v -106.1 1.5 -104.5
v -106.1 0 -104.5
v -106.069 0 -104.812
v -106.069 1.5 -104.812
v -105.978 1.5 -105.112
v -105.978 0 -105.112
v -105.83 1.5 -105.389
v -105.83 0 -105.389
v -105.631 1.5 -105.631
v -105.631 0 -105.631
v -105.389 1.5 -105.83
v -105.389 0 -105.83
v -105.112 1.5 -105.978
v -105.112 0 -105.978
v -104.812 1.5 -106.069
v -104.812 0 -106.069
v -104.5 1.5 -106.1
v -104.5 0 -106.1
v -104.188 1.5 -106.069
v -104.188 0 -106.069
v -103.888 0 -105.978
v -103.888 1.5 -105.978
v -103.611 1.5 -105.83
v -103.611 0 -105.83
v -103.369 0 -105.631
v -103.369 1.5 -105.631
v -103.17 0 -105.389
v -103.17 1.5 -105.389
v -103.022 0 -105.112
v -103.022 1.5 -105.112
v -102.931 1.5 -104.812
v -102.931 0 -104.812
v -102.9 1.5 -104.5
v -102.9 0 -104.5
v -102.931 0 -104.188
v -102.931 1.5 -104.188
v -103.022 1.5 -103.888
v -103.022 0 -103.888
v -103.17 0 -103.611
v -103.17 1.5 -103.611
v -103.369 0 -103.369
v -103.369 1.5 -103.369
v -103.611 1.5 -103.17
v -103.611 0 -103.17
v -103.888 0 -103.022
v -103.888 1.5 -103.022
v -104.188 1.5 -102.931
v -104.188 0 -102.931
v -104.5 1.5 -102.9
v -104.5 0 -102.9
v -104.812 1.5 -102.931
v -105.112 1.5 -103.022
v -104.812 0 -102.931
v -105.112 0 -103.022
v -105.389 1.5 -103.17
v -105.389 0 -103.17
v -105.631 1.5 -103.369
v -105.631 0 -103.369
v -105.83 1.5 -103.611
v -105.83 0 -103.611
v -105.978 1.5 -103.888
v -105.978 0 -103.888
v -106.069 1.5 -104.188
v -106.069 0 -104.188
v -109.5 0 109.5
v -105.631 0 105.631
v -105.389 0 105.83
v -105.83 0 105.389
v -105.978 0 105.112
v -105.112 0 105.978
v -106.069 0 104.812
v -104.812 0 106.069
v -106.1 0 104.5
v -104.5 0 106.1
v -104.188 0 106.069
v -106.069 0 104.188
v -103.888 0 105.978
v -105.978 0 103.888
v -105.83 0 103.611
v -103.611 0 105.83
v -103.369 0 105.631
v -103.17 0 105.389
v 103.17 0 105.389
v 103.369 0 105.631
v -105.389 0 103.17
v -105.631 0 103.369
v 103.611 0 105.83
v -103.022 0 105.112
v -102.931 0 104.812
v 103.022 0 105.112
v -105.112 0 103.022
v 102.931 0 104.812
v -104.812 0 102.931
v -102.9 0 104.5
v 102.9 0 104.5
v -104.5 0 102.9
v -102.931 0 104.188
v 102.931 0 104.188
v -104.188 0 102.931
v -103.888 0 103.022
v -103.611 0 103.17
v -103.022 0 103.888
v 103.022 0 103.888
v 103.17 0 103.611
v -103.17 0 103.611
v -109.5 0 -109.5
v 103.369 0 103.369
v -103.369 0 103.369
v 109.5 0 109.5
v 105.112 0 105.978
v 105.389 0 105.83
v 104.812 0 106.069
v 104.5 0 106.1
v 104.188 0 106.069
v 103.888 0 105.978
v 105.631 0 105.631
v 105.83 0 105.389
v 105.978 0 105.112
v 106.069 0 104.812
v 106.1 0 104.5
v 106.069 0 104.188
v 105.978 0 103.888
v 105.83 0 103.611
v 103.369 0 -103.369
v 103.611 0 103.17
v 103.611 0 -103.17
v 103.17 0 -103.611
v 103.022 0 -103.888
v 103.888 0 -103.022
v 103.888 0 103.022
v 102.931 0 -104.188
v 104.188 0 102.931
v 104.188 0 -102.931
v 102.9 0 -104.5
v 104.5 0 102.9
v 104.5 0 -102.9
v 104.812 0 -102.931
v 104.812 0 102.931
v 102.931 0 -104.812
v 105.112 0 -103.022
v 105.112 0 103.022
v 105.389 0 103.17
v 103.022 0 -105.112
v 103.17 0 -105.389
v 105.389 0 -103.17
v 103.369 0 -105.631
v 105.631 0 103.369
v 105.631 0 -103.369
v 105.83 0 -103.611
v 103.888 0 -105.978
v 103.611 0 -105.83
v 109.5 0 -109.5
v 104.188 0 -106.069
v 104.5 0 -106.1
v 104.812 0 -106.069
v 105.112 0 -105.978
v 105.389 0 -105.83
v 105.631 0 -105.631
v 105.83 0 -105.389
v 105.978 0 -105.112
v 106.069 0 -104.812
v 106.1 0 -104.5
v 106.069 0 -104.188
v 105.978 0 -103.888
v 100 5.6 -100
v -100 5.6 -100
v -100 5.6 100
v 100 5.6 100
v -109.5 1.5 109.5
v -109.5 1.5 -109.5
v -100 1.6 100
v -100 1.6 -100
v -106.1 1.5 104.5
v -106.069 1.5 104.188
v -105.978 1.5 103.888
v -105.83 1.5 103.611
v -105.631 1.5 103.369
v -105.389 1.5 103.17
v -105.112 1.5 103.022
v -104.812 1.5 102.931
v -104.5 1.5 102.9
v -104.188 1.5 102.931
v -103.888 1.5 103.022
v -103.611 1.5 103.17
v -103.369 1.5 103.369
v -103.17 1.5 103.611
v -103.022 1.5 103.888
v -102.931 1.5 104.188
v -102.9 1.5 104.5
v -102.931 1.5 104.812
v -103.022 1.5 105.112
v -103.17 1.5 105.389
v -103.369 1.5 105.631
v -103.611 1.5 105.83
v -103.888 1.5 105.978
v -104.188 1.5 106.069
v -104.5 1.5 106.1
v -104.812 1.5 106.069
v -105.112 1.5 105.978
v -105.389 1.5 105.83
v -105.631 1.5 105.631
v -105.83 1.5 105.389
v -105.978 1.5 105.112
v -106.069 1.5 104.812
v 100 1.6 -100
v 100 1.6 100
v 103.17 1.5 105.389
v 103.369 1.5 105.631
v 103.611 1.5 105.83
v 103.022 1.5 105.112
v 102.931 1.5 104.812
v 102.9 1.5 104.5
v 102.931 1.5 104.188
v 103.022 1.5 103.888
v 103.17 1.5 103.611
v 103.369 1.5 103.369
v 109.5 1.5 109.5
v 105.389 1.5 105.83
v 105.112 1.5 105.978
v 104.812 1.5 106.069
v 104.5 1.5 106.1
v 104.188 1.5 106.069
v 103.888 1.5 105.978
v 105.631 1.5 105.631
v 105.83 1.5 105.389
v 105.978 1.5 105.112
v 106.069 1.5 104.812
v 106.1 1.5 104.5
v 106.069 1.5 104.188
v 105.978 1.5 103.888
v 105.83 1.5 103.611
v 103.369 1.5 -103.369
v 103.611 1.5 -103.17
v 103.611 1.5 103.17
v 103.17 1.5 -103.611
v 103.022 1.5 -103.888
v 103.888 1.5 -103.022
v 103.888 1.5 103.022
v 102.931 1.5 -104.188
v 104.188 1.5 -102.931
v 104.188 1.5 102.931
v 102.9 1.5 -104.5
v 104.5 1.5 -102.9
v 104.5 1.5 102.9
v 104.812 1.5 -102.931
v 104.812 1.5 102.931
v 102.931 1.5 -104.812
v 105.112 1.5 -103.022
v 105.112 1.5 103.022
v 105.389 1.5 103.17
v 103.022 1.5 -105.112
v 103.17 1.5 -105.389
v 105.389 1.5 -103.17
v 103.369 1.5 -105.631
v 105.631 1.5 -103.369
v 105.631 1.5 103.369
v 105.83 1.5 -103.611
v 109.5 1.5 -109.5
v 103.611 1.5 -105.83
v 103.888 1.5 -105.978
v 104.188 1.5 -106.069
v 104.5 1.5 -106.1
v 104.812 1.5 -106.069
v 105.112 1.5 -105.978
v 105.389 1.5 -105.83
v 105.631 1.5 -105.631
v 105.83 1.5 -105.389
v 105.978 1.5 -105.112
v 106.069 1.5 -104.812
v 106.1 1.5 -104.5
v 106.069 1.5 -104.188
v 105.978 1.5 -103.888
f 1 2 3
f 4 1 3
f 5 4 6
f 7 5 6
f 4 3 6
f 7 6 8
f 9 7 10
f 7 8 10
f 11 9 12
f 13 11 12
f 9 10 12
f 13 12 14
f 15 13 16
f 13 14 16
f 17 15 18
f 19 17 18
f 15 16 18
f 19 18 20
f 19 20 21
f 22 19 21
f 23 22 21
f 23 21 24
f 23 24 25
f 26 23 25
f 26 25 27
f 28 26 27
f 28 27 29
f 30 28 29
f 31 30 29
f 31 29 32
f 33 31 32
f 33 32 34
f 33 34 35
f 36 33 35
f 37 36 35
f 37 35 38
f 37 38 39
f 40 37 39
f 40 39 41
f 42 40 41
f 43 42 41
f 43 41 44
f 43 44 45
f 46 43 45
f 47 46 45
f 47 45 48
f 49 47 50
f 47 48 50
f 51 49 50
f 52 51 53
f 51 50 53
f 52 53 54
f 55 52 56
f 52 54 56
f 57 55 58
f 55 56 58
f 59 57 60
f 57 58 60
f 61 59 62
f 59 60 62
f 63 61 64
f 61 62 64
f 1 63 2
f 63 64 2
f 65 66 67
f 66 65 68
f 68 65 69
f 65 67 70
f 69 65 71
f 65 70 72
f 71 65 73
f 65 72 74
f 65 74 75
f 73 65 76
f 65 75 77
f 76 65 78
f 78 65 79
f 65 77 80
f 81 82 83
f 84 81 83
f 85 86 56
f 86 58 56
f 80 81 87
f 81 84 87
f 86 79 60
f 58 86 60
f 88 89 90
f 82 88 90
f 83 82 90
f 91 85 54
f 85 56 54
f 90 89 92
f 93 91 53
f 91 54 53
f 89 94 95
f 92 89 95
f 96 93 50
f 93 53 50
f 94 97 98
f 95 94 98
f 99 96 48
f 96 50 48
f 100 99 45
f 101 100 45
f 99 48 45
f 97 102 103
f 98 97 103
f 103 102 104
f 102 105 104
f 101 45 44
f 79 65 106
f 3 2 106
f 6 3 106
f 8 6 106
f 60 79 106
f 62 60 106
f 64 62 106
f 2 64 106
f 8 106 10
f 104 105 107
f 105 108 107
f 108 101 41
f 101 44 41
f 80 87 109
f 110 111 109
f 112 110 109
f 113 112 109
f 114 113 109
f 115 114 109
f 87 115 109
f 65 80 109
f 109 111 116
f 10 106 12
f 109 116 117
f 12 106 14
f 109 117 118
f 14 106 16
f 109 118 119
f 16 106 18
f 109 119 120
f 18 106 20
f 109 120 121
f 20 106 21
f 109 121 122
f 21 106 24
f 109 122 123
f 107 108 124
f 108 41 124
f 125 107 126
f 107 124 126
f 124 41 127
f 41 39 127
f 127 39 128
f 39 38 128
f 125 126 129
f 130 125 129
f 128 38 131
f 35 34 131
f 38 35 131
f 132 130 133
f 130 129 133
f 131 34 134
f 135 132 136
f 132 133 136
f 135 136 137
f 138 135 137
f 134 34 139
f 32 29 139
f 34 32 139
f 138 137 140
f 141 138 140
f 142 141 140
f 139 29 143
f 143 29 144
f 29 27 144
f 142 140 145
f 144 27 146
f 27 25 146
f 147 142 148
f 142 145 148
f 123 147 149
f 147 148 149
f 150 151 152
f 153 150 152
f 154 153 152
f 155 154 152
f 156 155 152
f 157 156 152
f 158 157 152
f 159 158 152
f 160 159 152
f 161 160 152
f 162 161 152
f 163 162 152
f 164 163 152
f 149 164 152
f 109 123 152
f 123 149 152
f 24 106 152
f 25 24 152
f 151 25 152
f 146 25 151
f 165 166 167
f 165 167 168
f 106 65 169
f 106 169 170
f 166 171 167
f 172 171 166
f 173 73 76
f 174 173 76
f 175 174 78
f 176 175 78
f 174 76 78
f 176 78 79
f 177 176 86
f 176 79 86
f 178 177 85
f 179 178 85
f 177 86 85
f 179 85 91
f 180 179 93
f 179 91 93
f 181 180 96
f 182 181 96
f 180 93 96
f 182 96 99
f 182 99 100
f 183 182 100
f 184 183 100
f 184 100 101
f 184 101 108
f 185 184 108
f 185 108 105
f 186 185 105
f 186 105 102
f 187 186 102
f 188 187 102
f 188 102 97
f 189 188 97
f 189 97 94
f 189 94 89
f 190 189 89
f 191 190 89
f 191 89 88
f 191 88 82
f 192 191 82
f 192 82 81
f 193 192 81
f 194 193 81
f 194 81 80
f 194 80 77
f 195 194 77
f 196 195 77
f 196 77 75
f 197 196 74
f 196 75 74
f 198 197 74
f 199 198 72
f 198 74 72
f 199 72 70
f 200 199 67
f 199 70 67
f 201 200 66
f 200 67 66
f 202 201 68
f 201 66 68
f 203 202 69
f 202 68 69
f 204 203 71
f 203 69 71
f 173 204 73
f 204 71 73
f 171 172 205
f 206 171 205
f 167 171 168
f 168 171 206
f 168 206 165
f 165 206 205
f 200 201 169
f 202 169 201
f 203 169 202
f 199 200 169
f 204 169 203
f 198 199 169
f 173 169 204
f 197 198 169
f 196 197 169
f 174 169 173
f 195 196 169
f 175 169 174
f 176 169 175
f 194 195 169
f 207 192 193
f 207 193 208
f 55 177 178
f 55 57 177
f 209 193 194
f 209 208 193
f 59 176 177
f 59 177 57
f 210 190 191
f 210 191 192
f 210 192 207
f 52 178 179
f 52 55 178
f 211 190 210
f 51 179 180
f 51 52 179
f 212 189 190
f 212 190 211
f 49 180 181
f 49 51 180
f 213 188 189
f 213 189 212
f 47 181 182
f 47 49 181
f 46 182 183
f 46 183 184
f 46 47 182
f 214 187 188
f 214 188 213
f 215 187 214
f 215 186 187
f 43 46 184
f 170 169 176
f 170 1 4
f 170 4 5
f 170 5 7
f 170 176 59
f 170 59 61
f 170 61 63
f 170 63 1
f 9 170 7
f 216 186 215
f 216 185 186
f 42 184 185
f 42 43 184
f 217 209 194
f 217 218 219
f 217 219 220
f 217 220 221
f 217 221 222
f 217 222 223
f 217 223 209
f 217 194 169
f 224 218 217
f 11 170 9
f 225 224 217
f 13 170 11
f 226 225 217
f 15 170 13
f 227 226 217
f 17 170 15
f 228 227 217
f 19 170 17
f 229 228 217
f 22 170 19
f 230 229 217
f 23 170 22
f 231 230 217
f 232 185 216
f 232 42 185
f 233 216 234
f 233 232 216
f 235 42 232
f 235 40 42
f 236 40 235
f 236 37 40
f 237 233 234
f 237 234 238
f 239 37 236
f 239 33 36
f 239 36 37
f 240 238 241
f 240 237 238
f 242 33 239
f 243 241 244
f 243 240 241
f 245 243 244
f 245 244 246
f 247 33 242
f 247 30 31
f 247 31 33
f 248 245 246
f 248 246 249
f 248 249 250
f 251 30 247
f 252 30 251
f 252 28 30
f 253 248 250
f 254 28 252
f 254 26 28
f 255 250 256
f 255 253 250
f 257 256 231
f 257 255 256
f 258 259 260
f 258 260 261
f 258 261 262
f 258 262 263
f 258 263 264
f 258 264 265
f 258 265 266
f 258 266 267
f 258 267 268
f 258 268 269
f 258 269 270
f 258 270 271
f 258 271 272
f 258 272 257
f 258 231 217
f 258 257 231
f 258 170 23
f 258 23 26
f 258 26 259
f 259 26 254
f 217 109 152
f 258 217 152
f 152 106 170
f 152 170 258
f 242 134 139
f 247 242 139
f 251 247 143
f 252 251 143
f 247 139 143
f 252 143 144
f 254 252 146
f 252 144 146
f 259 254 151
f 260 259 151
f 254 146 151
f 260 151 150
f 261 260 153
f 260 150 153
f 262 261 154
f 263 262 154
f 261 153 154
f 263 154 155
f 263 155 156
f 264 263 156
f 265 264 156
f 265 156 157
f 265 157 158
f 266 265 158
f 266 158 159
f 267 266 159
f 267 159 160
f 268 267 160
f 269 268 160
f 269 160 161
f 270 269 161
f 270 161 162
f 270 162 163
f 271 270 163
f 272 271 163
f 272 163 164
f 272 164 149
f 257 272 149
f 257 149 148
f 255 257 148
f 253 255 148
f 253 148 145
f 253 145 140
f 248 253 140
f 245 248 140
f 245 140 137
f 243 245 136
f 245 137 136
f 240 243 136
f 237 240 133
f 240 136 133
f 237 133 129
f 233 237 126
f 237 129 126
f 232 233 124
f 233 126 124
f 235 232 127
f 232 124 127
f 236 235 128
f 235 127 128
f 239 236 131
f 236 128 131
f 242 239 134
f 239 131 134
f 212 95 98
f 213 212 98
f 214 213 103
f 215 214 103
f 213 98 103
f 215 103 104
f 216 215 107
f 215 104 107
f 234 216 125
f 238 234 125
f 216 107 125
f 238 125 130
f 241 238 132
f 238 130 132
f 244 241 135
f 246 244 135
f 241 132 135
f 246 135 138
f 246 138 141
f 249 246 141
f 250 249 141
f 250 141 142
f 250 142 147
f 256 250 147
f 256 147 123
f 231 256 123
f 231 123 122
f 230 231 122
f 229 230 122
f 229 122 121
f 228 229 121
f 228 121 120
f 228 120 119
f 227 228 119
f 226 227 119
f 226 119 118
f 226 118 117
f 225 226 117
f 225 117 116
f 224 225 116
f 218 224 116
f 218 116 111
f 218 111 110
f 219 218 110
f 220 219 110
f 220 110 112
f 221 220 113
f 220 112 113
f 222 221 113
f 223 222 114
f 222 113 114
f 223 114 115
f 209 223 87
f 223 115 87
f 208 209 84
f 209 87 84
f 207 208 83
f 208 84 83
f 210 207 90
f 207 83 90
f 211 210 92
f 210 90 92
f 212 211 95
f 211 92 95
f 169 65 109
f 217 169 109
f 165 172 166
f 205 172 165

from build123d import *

# Parameters (mm, degrees)
SKETCH1_W            = 219
SKETCH1_H            = 219
BOSS_EXTRUDE1_DEPTH  = 1.5
M3_CLEARANCE_HOLE1_D = 3.2
SKETCH5_W            = 200
SKETCH5_H            = 200
BOSS_EXTRUDE2_DEPTH  = 4


with BuildPart() as part:
    # Sketch1 → Boss-Extrude1 (new body)
    with BuildSketch(Plane(origin=(0, 0, 0), x_dir=(1, 0, 0), z_dir=(0, 1, 0))):
        Rectangle(SKETCH1_W, SKETCH1_H)
    extrude(amount=BOSS_EXTRUDE1_DEPTH)

    # M3 Clearance Hole1 (through all)
    with Locations(Plane(origin=(0, 1.5, 0), x_dir=(1, 0, 0), z_dir=(0, 1, 0))):
        with Locations((-104.5, 104.5), (104.5, 104.5), (104.5, -104.5), (-104.5, -104.5)):
            Hole(M3_CLEARANCE_HOLE1_D / 2)


with BuildPart() as body_2:
    # Sketch5 → Boss-Extrude2 (new body)
    with BuildSketch(Plane(origin=(0, 1.6, 0), x_dir=(1, 0, 0), z_dir=(0, 1, 0))):
        Rectangle(SKETCH5_W, SKETCH5_H)
    extrude(amount=BOSS_EXTRUDE2_DEPTH)


solid = Compound([part.part, body_2.part])
